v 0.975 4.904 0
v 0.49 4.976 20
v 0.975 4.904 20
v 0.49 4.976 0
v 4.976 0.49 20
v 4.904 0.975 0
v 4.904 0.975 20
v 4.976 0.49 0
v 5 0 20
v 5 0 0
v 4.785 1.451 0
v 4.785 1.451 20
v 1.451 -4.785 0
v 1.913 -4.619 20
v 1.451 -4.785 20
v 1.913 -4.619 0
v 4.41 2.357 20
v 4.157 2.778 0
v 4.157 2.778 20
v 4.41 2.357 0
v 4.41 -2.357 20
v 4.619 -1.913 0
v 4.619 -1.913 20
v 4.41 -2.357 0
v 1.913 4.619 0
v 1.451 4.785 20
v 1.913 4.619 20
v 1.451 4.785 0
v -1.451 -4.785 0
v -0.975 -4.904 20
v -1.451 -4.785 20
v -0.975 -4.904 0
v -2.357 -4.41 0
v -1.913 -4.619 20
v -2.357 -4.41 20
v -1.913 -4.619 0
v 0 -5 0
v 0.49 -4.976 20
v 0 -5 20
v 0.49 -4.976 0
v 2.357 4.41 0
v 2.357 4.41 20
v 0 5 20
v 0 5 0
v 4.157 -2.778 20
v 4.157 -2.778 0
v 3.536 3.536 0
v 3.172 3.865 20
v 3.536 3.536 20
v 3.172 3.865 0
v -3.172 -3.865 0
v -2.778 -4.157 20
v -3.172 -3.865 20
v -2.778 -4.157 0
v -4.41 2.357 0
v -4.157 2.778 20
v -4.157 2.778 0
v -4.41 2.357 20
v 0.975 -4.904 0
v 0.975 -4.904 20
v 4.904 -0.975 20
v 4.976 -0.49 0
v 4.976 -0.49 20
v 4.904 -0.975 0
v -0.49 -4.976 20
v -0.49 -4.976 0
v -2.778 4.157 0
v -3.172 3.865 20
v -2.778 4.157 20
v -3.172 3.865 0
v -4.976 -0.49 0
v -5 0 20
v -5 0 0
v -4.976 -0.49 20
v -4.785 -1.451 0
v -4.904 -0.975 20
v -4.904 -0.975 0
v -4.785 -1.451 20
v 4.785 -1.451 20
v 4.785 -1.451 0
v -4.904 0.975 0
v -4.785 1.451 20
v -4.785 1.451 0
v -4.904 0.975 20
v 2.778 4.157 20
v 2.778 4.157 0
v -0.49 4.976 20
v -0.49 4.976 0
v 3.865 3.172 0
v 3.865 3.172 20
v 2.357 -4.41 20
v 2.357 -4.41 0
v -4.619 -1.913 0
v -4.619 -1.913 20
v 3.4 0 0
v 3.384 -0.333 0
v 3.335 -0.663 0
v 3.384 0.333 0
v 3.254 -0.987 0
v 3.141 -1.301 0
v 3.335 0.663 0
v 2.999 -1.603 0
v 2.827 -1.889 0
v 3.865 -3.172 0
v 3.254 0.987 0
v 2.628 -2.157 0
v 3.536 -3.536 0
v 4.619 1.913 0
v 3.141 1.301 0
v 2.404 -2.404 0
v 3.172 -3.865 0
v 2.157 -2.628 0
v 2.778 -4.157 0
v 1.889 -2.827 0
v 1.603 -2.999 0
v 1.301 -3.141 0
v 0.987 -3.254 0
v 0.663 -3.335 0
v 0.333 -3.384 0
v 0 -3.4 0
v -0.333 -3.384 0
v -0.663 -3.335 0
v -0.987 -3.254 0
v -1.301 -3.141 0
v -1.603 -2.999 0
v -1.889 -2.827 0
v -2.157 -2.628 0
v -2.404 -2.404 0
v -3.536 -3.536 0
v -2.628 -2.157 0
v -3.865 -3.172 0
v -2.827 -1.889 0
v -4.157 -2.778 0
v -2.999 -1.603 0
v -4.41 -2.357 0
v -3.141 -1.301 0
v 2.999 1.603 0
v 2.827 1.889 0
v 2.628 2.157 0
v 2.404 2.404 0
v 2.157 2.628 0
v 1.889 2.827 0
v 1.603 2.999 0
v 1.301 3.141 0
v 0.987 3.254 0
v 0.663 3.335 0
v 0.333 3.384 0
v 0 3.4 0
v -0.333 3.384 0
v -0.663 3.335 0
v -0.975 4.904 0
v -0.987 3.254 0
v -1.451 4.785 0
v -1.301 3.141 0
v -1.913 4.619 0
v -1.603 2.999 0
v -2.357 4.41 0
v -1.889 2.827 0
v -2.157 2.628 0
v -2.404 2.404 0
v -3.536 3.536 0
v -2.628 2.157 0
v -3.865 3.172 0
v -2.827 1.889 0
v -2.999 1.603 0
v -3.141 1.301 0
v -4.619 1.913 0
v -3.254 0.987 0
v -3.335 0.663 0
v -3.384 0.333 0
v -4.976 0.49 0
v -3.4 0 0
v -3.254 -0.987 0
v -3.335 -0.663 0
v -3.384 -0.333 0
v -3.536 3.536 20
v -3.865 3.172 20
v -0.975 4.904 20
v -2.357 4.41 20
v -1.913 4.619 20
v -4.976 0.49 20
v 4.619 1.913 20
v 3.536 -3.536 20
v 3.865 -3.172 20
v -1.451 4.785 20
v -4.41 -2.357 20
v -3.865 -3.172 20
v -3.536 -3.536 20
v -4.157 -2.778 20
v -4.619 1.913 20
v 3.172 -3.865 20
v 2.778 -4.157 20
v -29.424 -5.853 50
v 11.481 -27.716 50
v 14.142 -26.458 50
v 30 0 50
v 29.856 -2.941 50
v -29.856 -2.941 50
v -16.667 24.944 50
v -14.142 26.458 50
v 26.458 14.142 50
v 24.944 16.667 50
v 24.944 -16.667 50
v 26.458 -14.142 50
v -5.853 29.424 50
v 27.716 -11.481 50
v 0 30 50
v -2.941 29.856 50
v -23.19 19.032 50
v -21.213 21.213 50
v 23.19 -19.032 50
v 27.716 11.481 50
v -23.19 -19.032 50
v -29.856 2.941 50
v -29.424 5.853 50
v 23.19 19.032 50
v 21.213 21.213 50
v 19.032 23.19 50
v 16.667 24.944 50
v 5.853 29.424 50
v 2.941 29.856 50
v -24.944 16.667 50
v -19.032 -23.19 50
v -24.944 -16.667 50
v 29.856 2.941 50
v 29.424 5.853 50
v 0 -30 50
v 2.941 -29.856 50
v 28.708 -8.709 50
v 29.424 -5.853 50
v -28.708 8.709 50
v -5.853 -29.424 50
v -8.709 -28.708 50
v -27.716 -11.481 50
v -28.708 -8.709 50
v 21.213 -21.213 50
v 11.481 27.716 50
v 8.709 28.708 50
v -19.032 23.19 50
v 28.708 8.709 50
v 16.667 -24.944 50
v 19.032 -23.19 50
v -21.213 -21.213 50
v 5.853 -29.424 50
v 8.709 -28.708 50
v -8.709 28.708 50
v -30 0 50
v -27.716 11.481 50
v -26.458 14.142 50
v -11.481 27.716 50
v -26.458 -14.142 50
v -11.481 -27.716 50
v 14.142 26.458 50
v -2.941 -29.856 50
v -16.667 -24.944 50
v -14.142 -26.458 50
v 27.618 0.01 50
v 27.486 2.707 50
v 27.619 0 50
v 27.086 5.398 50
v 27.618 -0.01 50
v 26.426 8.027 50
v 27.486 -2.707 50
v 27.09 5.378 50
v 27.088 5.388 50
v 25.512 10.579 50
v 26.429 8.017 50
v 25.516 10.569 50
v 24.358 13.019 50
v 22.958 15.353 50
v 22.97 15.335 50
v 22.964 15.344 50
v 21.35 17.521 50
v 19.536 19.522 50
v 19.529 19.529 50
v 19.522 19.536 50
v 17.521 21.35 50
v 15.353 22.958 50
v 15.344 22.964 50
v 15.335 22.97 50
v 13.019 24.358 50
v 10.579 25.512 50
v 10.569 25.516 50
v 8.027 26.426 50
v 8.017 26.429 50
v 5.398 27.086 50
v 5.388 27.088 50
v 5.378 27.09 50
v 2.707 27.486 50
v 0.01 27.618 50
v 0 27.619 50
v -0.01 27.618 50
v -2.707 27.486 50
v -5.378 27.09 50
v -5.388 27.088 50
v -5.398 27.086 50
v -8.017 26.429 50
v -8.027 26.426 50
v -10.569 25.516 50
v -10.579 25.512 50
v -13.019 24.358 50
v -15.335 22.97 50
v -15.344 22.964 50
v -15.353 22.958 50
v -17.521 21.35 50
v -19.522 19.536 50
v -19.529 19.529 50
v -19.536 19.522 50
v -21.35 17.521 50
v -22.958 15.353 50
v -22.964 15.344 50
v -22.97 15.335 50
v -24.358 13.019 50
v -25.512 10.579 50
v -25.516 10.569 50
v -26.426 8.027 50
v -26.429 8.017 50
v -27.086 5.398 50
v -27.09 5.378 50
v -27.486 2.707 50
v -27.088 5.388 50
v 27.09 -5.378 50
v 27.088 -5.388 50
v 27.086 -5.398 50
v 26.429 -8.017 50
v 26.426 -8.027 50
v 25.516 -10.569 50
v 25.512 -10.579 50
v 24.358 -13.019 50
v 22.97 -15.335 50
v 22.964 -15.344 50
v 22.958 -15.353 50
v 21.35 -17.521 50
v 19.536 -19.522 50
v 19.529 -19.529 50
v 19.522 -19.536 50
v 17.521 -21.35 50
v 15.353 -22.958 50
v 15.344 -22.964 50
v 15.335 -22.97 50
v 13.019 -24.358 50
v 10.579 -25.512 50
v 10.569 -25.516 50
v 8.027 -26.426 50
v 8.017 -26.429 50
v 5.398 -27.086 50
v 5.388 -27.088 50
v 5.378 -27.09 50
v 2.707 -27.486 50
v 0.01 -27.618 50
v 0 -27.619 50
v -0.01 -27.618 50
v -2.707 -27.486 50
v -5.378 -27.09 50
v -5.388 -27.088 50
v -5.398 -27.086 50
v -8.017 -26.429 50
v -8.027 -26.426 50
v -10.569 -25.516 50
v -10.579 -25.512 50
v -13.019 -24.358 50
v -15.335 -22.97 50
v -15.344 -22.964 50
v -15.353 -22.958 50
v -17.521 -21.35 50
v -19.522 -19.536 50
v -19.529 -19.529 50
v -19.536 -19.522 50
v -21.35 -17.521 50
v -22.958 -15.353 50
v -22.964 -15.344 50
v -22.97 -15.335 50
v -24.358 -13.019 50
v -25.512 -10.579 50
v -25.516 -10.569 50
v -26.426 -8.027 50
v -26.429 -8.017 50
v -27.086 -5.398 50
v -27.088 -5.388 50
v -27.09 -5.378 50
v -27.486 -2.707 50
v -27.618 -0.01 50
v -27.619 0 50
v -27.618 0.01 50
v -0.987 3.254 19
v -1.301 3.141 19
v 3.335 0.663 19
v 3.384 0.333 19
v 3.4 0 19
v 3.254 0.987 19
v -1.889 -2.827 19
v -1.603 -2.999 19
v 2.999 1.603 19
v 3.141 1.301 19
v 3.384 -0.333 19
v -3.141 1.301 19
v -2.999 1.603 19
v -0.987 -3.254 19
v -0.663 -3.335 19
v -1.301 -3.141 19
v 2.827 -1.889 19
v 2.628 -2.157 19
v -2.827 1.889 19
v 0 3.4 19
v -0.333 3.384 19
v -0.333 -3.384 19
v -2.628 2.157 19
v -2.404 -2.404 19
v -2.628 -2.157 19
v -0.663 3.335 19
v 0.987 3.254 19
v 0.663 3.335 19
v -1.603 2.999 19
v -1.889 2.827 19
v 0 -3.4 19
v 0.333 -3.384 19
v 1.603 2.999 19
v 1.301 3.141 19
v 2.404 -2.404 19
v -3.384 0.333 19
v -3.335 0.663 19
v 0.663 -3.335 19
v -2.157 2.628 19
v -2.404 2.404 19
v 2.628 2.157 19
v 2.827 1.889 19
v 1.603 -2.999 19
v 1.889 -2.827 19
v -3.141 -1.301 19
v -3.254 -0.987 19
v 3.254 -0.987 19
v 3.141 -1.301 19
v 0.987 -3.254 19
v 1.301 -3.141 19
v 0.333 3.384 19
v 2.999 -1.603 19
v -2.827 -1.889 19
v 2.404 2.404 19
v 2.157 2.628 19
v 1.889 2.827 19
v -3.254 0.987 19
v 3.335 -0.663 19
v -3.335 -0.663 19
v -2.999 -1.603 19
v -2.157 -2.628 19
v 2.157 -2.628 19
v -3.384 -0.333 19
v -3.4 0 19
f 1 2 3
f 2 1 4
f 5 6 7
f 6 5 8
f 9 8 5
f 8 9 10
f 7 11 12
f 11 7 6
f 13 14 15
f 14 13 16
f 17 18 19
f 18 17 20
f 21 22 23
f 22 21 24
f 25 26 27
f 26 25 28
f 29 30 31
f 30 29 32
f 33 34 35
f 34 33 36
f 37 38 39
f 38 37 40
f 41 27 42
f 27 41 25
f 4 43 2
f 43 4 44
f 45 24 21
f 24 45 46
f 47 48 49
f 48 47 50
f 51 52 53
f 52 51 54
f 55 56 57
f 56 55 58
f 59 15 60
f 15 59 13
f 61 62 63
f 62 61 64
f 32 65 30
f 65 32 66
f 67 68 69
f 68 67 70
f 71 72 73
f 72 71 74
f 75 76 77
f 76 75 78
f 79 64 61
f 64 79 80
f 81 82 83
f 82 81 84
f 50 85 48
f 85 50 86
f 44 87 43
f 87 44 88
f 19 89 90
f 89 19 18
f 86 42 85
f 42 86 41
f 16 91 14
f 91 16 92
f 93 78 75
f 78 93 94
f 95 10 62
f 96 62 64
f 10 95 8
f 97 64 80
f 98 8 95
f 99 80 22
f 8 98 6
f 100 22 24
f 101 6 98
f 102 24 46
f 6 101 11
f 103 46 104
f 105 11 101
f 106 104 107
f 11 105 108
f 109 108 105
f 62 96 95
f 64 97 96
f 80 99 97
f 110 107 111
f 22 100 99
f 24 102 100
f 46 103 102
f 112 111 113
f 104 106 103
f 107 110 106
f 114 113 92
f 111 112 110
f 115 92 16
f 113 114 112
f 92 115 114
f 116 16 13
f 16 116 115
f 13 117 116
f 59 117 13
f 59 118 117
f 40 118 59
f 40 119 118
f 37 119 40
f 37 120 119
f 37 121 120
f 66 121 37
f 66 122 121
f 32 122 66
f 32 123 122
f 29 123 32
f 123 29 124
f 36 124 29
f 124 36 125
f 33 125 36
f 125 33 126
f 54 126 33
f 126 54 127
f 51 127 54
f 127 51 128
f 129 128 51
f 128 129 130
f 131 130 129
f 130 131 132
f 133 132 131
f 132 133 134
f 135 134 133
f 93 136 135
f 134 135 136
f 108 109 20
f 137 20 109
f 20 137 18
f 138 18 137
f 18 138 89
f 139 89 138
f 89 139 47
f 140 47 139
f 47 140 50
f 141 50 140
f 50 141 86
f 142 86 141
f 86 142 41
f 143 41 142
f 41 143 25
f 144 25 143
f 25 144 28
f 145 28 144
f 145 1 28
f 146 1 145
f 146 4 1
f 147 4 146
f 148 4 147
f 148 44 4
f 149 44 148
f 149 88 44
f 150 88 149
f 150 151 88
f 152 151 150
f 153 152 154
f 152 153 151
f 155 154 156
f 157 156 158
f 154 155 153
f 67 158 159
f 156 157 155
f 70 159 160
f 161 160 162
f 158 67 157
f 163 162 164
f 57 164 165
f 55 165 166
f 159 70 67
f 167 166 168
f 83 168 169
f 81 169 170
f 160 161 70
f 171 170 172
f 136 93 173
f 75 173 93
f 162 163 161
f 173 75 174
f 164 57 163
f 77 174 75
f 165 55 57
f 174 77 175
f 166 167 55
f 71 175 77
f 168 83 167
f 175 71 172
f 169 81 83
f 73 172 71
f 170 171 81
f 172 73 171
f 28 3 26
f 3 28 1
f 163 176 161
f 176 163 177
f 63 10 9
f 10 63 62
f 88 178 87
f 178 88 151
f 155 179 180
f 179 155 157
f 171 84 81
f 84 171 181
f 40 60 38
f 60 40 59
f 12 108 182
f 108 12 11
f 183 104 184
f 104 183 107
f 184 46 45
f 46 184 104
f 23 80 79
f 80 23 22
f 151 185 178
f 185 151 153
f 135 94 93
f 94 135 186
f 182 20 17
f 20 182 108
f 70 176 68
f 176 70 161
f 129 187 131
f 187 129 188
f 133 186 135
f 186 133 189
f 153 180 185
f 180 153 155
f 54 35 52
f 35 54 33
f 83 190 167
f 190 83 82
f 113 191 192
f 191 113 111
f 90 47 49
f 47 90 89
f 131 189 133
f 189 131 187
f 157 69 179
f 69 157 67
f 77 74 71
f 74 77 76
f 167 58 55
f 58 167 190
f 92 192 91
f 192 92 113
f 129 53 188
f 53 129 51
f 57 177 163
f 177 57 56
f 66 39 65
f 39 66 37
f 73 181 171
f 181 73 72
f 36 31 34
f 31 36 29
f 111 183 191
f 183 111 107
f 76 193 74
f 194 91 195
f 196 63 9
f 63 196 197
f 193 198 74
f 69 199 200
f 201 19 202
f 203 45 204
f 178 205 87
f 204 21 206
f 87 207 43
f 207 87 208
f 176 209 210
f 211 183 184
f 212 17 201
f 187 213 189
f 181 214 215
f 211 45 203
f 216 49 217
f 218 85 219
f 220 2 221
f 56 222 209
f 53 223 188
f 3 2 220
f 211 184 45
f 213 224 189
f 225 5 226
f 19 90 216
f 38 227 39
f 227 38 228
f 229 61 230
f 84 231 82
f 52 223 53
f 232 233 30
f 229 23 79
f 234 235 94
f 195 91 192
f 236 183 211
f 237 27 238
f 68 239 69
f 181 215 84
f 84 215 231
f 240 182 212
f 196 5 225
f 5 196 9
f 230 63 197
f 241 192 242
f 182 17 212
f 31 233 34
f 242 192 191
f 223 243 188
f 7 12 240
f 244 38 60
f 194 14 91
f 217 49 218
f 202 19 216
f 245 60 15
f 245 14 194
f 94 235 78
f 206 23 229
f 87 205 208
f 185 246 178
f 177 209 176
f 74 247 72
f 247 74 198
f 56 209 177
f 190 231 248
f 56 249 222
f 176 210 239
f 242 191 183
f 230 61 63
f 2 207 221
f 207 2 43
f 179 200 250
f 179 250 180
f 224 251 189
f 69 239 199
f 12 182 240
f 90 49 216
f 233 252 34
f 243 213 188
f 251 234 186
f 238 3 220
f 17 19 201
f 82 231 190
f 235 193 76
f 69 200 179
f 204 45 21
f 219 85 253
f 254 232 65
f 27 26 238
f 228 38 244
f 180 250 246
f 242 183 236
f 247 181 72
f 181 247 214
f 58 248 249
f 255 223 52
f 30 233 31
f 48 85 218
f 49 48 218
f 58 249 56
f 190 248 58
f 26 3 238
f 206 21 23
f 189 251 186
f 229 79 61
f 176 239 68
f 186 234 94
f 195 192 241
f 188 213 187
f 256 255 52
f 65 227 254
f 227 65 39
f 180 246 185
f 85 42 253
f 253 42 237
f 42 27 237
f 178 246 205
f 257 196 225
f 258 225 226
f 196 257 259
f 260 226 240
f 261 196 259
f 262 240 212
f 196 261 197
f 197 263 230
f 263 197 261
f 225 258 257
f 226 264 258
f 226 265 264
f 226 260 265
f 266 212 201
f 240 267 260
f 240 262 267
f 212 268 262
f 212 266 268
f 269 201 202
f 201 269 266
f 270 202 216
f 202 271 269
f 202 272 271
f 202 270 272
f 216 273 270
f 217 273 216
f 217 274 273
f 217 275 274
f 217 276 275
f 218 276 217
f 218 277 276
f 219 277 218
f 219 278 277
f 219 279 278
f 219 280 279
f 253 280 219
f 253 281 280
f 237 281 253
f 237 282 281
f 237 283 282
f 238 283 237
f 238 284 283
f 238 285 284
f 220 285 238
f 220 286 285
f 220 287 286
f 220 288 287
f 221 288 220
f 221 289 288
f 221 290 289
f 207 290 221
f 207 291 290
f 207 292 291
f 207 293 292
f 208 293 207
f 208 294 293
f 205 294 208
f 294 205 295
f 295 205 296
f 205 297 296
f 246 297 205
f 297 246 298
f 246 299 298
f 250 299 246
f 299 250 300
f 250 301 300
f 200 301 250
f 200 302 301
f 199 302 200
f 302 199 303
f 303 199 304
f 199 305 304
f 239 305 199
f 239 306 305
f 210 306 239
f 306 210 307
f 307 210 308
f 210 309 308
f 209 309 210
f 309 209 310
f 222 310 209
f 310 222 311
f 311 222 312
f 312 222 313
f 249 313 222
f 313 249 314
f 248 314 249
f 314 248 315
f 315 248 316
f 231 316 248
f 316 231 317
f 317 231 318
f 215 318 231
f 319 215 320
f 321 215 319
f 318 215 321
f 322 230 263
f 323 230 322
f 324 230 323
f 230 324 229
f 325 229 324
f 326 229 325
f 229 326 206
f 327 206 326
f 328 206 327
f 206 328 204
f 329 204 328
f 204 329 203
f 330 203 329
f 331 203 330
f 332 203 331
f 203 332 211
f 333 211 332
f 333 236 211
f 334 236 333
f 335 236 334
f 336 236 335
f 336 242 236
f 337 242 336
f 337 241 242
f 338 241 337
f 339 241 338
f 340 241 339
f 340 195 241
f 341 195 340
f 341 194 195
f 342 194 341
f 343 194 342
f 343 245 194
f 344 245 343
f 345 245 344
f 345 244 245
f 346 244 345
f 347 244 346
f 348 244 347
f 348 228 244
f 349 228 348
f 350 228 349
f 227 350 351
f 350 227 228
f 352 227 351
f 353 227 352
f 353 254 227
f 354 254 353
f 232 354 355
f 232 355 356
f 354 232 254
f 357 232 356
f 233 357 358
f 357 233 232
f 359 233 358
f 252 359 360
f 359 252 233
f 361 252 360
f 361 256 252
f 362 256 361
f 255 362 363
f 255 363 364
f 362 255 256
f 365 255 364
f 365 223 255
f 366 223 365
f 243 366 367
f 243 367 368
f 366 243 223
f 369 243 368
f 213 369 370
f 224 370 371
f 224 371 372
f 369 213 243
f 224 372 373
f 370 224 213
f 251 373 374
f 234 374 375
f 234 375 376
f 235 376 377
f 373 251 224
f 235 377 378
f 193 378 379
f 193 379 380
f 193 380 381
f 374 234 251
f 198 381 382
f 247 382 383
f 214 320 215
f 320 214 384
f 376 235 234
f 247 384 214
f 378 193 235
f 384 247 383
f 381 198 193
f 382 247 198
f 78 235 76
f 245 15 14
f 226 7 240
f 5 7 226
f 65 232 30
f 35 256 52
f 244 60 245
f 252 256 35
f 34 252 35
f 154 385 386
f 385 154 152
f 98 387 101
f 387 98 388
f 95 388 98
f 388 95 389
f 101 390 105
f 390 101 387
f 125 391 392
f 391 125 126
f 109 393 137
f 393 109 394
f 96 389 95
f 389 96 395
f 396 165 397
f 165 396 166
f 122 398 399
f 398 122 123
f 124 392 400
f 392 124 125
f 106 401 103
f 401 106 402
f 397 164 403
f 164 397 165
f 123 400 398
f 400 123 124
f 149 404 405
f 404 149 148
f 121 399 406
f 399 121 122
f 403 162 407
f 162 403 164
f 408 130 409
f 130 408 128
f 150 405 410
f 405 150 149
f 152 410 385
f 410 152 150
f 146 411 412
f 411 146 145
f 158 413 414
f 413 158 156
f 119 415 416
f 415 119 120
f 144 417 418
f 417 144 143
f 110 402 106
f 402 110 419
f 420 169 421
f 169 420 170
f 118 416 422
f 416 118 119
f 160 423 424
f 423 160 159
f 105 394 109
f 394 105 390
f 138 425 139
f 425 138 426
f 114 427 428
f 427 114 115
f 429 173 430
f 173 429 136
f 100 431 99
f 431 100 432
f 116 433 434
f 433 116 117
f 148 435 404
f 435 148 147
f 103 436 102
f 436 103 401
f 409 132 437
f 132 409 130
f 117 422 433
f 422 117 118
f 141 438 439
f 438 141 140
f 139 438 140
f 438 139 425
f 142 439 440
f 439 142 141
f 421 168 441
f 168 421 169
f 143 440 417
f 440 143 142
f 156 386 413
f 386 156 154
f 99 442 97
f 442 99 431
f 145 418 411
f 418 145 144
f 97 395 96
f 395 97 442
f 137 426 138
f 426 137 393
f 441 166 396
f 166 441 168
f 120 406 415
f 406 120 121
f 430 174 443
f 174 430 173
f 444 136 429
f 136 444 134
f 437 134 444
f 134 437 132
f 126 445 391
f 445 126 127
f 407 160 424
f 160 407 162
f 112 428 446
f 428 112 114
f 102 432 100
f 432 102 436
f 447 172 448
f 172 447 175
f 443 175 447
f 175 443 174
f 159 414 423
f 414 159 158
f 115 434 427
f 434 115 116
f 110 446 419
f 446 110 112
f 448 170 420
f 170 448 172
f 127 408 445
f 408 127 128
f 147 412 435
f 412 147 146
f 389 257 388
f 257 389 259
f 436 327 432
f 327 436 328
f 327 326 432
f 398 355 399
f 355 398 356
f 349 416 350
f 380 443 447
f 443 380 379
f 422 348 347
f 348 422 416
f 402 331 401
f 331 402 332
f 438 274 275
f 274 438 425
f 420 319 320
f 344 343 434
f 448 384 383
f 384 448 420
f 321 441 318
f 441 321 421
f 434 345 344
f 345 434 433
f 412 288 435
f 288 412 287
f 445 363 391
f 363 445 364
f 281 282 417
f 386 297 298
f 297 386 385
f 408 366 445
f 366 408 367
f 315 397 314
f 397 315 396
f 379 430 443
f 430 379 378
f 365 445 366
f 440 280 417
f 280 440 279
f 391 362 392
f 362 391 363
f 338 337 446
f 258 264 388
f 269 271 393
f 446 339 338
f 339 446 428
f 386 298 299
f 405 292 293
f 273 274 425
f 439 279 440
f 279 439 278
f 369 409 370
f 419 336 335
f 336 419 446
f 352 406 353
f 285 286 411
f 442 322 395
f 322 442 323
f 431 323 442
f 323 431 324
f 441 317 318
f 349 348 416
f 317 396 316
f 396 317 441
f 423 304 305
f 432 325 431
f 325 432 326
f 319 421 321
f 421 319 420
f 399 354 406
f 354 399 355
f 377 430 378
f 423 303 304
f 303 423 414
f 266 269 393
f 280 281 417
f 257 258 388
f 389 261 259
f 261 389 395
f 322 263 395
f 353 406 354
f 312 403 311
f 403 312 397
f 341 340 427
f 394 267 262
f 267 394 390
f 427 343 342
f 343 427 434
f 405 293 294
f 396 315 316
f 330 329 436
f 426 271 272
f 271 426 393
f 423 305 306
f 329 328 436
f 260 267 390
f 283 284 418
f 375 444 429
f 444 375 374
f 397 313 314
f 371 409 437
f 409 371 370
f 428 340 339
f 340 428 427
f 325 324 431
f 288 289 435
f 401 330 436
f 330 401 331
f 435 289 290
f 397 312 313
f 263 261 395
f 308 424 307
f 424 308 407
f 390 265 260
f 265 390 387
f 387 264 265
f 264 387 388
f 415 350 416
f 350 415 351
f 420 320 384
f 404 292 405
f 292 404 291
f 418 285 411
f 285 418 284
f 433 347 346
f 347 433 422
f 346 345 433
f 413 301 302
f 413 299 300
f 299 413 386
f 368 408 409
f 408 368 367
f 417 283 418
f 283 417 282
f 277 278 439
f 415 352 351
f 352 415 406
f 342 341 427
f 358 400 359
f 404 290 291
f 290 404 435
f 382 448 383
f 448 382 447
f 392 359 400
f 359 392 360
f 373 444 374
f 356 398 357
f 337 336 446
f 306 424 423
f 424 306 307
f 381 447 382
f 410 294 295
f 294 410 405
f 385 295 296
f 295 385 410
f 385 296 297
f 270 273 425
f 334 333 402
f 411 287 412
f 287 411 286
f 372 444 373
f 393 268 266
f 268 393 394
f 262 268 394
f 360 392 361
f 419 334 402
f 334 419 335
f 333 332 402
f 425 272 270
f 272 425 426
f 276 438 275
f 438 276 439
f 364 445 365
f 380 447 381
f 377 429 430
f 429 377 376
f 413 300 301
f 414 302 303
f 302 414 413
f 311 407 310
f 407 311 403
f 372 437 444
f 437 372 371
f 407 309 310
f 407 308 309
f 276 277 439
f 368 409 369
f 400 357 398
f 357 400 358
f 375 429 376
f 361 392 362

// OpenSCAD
// Small lab funnel, printed upright (wide opening at top).
// All dimensions in millimetres.

// --- Named dimensions (measured with calipers) ---
spout_od   = 10;   // spout outer diameter
spout_id   = 6.8;  // spout inner (bore) diameter  (10 - 2*1.6)
spout_h    = 20;   // straight spout height (z = 0 .. 20)
cone_h     = 30;   // cone height (z = 20 .. 50)
cone_rim_od= 60;   // cone outer diameter at rim (z = 50)
cone_rim_id= 56.8; // cone inner diameter at rim (60 - 2*1.6)
wall       = 1.6;  // uniform wall thickness

// Derived radii (outer / inner)
spout_or  = spout_od   / 2;   // 5
spout_ir  = spout_id   / 2;   // 3.4
cone_top_or = cone_rim_od / 2; // 30
cone_top_ir = cone_rim_id / 2; // 28.4

// Smooth curved surfaces
$fn = 64;

// ---- Outer solid: straight spout + widening cone (both solid) ----
module outer() { union() {
    // Straight spout, z = 0 .. 20
    cylinder(h = spout_h, r = spout_or, $fn = $fn);

    // Cone, z = 20 .. 50, widening from spout OD to rim OD
    translate([0, 0, spout_h])
        cylinder(h = cone_h, r1 = spout_or, r2 = cone_top_or, $fn = $fn);
} }

// ---- Inner cavity: straight bore + widening bore (open top & bottom) ----
// Each bore is extended 1 mm past the faces it cuts so no faces are coplanar.
module cavity() { union() {
    // Straight bore, z = -1 .. 21  (1 mm past bottom, 1 mm into cone)
    cylinder(h = spout_h + 2, r = spout_ir, $fn = $fn);

    // Cone bore, z = 19 .. 51  (1 mm into spout, 1 mm past rim)
    translate([0, 0, spout_h - 1])
        cylinder(h = cone_h + 2, r1 = spout_ir, r2 = cone_top_ir, $fn = $fn);
} }

// ---- Funnel = outer minus cavity ----
difference() {
    outer();
    cavity();
}
